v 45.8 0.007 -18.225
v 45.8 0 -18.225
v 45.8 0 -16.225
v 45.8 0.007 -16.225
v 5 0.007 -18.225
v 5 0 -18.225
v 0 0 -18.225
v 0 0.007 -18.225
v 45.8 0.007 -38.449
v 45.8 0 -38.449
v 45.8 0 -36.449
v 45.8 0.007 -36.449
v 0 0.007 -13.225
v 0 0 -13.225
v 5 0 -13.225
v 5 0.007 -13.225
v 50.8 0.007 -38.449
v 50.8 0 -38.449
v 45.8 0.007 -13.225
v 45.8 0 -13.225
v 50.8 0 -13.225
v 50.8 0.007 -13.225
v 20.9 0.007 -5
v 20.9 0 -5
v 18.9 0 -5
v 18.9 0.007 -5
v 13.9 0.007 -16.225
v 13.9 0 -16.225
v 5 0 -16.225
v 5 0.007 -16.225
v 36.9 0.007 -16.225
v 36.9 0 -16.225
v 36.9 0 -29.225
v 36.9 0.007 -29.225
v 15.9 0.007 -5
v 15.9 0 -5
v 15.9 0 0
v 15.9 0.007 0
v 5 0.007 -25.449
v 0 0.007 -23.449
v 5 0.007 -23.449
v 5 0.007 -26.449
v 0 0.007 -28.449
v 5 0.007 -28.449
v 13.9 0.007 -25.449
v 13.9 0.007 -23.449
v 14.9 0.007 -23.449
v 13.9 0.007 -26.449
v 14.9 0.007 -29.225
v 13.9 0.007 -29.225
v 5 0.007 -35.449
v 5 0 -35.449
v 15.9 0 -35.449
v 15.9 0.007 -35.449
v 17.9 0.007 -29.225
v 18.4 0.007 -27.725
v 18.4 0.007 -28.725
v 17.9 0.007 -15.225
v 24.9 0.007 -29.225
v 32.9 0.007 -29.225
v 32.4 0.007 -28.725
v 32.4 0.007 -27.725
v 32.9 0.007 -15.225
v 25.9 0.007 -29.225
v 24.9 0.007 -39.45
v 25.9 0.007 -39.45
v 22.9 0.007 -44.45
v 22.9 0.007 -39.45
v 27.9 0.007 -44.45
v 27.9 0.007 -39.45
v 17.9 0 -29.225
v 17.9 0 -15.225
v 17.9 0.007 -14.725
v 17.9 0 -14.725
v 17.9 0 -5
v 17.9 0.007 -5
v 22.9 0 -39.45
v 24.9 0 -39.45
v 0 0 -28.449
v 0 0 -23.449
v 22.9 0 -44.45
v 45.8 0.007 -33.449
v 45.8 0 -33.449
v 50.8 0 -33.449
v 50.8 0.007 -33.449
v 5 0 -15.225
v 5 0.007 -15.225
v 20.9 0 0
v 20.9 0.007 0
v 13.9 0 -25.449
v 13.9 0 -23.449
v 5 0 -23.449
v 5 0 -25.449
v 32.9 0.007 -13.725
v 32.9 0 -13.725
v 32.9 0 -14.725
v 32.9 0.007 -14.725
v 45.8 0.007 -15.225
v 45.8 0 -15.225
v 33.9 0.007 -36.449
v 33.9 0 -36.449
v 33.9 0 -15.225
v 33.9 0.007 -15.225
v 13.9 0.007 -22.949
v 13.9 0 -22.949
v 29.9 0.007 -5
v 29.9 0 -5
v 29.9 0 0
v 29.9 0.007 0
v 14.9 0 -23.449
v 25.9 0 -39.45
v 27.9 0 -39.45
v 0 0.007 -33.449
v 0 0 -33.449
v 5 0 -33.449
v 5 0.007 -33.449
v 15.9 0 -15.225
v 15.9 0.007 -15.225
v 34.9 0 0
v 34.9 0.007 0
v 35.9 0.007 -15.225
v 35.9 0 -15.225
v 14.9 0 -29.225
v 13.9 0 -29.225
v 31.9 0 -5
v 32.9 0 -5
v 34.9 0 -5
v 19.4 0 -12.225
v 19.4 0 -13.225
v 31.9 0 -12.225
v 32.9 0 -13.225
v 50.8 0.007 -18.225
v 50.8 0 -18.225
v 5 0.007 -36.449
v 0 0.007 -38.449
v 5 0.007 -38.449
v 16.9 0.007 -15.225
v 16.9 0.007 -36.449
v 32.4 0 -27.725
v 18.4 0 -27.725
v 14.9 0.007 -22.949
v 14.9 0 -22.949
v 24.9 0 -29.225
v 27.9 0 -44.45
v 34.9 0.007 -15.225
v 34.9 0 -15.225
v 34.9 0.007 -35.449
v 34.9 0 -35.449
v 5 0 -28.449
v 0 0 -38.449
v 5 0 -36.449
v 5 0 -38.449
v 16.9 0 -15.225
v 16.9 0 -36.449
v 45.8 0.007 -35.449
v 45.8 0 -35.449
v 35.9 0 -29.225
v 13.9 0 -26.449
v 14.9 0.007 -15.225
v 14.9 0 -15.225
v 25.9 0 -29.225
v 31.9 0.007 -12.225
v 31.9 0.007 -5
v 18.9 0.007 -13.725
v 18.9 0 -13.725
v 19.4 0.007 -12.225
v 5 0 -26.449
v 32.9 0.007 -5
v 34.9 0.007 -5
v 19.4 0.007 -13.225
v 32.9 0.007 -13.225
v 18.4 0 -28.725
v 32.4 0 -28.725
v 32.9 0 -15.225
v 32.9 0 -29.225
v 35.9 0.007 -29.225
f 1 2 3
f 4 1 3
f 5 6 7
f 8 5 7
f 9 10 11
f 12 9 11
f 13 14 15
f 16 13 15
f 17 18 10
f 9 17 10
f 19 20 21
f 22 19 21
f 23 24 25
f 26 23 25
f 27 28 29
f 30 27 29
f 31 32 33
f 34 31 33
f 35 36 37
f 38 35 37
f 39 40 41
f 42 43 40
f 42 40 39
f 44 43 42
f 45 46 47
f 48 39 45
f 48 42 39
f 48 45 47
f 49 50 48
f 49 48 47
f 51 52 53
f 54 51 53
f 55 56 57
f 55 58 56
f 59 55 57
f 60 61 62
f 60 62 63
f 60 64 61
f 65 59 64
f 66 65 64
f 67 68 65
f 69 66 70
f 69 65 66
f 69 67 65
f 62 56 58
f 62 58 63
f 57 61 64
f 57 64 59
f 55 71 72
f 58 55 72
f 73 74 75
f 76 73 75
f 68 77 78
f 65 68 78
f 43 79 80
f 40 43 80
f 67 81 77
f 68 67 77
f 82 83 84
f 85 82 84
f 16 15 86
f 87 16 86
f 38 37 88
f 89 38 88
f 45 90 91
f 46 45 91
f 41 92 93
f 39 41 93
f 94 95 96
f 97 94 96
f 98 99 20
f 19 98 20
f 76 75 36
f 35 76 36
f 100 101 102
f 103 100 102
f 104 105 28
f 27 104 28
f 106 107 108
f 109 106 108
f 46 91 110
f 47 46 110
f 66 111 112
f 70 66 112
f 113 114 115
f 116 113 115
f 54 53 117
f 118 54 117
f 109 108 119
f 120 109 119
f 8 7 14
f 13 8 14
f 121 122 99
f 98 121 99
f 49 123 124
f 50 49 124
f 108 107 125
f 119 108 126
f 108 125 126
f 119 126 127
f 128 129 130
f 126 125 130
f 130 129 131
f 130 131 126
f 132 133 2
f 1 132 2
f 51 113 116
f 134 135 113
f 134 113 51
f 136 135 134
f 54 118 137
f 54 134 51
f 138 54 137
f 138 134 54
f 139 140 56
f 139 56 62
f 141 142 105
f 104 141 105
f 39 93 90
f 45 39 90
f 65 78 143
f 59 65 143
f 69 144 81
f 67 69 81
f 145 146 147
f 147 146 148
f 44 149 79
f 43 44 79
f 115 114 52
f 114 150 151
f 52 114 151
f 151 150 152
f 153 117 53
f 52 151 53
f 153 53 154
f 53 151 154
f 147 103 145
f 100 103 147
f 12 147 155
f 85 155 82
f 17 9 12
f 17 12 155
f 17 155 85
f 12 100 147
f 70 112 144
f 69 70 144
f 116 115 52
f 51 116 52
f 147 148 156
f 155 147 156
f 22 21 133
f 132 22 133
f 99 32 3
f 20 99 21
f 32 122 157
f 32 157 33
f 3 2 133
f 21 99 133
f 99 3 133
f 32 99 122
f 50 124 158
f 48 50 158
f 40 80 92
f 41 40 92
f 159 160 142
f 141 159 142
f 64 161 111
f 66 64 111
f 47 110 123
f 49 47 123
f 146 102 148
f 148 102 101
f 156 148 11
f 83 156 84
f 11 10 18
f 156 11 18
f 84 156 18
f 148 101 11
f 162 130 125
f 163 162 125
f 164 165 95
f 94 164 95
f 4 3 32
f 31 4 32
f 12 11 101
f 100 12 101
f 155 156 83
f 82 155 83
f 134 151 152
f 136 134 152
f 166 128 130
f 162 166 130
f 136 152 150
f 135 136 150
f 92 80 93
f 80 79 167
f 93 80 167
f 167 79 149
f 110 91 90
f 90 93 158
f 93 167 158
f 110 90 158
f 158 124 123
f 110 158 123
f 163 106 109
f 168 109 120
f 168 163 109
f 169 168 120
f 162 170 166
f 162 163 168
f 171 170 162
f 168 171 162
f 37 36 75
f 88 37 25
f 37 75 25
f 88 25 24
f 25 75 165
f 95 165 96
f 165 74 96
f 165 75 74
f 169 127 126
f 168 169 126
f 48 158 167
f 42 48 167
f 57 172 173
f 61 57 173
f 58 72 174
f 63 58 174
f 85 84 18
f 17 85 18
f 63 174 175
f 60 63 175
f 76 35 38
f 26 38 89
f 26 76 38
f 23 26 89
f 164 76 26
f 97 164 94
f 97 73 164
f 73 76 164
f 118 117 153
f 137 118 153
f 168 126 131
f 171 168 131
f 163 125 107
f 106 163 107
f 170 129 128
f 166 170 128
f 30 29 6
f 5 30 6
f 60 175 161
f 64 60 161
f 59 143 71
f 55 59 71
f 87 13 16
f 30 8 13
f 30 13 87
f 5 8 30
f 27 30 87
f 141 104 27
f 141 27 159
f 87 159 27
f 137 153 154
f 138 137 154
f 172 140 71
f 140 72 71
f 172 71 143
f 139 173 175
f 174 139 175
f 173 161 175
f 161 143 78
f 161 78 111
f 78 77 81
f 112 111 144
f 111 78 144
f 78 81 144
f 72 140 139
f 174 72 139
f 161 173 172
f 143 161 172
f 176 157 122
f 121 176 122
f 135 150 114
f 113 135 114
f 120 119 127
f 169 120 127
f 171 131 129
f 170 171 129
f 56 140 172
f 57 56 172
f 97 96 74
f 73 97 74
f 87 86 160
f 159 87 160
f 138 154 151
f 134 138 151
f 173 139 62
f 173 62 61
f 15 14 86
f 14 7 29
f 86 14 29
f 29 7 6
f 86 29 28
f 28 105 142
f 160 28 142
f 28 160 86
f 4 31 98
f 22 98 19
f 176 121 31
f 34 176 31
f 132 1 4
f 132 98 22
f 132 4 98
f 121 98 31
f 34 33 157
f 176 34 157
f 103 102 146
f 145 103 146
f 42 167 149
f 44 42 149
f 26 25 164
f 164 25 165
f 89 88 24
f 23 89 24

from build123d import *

# Parameters (mm, degrees)
SKETCH1_W           = 10
SKETCH1_H           = 10
SKETCH1_W_2         = 14
SKETCH1_H_2         = 1
BOSS_EXTRUDE1_DEPTH = 0.007


with BuildPart() as part:
    # Sketch1 → Boss-Extrude1 (new body)
    with BuildSketch(Plane(origin=(0, 0, 0), x_dir=(1, 0, 0), z_dir=(0, 1, 0))):
        Polygon((5, 18.225), (0, 18.225), (0, 13.225), (5, 13.225), (5, 15.225), (14.9, 15.225), (14.9, 22.948719865), (13.9, 22.948719865), (13.9, 16.225), (5, 16.225), align=None)
        Polygon((5, 28.448719865), (0, 28.448719865), (0, 23.448719865), (5, 23.448719865), (5, 25.448719865), (13.9, 25.448719865), (13.9, 23.448719865), (14.9, 23.448719865), (14.9, 29.225), (13.9, 29.225), (13.9, 26.448719865), (5, 26.448719865), align=None)
        Polygon((5, 38.448719865), (0, 38.448719865), (0, 33.448719865), (5, 33.448719865), (5, 35.448719865), (15.9, 35.448719865), (15.9, 15.225), (16.9, 15.225), (16.9, 36.448719865), (5, 36.448719865), align=None)
        Polygon((32.9, 29.225), (25.9, 29.225), (25.9, 39.45), (27.9, 39.45), (27.9, 44.45), (22.9, 44.45), (22.9, 39.45), (24.9, 39.45), (24.9, 29.225), (17.9, 29.225), (17.9, 15.225), (32.9, 15.225), align=None)
        with Locations((25.4, 22.225)):
            Rectangle(SKETCH1_W, SKETCH1_H, mode=Mode.SUBTRACT)
        with Locations((25.4, 28.225)):
            Rectangle(SKETCH1_W_2, SKETCH1_H_2, mode=Mode.SUBTRACT)
        Polygon((50.8, 33.448719865), (50.8, 38.448719865), (45.8, 38.448719865), (45.8, 36.448719865), (33.9, 36.448719865), (33.9, 15.225), (34.9, 15.225), (34.9, 35.448719865), (45.8, 35.448719865), (45.8, 33.448719865), align=None)
        Polygon((50.8, 13.225), (50.8, 18.225), (45.8, 18.225), (45.8, 16.225), (36.9, 16.225), (36.9, 29.225), (35.9, 29.225), (35.9, 15.225), (45.8, 15.225), (45.8, 13.225), align=None)
        Polygon((29.9, 0), (34.9, 0), (34.9, 5), (32.9, 5), (32.9, 13.225), (19.4, 13.225), (19.4, 12.225), (31.9, 12.225), (31.9, 5), (29.9, 5), align=None)
        Polygon((15.9, 0), (20.9, 0), (20.9, 5), (18.9, 5), (18.9, 13.725), (32.9, 13.725), (32.9, 14.725), (17.9, 14.725), (17.9, 5), (15.9, 5), align=None)
        with Locations((25.4, 22.225)):
            Rectangle(SKETCH1_W, SKETCH1_H)
    extrude(amount=BOSS_EXTRUDE1_DEPTH)


solid = part.part
